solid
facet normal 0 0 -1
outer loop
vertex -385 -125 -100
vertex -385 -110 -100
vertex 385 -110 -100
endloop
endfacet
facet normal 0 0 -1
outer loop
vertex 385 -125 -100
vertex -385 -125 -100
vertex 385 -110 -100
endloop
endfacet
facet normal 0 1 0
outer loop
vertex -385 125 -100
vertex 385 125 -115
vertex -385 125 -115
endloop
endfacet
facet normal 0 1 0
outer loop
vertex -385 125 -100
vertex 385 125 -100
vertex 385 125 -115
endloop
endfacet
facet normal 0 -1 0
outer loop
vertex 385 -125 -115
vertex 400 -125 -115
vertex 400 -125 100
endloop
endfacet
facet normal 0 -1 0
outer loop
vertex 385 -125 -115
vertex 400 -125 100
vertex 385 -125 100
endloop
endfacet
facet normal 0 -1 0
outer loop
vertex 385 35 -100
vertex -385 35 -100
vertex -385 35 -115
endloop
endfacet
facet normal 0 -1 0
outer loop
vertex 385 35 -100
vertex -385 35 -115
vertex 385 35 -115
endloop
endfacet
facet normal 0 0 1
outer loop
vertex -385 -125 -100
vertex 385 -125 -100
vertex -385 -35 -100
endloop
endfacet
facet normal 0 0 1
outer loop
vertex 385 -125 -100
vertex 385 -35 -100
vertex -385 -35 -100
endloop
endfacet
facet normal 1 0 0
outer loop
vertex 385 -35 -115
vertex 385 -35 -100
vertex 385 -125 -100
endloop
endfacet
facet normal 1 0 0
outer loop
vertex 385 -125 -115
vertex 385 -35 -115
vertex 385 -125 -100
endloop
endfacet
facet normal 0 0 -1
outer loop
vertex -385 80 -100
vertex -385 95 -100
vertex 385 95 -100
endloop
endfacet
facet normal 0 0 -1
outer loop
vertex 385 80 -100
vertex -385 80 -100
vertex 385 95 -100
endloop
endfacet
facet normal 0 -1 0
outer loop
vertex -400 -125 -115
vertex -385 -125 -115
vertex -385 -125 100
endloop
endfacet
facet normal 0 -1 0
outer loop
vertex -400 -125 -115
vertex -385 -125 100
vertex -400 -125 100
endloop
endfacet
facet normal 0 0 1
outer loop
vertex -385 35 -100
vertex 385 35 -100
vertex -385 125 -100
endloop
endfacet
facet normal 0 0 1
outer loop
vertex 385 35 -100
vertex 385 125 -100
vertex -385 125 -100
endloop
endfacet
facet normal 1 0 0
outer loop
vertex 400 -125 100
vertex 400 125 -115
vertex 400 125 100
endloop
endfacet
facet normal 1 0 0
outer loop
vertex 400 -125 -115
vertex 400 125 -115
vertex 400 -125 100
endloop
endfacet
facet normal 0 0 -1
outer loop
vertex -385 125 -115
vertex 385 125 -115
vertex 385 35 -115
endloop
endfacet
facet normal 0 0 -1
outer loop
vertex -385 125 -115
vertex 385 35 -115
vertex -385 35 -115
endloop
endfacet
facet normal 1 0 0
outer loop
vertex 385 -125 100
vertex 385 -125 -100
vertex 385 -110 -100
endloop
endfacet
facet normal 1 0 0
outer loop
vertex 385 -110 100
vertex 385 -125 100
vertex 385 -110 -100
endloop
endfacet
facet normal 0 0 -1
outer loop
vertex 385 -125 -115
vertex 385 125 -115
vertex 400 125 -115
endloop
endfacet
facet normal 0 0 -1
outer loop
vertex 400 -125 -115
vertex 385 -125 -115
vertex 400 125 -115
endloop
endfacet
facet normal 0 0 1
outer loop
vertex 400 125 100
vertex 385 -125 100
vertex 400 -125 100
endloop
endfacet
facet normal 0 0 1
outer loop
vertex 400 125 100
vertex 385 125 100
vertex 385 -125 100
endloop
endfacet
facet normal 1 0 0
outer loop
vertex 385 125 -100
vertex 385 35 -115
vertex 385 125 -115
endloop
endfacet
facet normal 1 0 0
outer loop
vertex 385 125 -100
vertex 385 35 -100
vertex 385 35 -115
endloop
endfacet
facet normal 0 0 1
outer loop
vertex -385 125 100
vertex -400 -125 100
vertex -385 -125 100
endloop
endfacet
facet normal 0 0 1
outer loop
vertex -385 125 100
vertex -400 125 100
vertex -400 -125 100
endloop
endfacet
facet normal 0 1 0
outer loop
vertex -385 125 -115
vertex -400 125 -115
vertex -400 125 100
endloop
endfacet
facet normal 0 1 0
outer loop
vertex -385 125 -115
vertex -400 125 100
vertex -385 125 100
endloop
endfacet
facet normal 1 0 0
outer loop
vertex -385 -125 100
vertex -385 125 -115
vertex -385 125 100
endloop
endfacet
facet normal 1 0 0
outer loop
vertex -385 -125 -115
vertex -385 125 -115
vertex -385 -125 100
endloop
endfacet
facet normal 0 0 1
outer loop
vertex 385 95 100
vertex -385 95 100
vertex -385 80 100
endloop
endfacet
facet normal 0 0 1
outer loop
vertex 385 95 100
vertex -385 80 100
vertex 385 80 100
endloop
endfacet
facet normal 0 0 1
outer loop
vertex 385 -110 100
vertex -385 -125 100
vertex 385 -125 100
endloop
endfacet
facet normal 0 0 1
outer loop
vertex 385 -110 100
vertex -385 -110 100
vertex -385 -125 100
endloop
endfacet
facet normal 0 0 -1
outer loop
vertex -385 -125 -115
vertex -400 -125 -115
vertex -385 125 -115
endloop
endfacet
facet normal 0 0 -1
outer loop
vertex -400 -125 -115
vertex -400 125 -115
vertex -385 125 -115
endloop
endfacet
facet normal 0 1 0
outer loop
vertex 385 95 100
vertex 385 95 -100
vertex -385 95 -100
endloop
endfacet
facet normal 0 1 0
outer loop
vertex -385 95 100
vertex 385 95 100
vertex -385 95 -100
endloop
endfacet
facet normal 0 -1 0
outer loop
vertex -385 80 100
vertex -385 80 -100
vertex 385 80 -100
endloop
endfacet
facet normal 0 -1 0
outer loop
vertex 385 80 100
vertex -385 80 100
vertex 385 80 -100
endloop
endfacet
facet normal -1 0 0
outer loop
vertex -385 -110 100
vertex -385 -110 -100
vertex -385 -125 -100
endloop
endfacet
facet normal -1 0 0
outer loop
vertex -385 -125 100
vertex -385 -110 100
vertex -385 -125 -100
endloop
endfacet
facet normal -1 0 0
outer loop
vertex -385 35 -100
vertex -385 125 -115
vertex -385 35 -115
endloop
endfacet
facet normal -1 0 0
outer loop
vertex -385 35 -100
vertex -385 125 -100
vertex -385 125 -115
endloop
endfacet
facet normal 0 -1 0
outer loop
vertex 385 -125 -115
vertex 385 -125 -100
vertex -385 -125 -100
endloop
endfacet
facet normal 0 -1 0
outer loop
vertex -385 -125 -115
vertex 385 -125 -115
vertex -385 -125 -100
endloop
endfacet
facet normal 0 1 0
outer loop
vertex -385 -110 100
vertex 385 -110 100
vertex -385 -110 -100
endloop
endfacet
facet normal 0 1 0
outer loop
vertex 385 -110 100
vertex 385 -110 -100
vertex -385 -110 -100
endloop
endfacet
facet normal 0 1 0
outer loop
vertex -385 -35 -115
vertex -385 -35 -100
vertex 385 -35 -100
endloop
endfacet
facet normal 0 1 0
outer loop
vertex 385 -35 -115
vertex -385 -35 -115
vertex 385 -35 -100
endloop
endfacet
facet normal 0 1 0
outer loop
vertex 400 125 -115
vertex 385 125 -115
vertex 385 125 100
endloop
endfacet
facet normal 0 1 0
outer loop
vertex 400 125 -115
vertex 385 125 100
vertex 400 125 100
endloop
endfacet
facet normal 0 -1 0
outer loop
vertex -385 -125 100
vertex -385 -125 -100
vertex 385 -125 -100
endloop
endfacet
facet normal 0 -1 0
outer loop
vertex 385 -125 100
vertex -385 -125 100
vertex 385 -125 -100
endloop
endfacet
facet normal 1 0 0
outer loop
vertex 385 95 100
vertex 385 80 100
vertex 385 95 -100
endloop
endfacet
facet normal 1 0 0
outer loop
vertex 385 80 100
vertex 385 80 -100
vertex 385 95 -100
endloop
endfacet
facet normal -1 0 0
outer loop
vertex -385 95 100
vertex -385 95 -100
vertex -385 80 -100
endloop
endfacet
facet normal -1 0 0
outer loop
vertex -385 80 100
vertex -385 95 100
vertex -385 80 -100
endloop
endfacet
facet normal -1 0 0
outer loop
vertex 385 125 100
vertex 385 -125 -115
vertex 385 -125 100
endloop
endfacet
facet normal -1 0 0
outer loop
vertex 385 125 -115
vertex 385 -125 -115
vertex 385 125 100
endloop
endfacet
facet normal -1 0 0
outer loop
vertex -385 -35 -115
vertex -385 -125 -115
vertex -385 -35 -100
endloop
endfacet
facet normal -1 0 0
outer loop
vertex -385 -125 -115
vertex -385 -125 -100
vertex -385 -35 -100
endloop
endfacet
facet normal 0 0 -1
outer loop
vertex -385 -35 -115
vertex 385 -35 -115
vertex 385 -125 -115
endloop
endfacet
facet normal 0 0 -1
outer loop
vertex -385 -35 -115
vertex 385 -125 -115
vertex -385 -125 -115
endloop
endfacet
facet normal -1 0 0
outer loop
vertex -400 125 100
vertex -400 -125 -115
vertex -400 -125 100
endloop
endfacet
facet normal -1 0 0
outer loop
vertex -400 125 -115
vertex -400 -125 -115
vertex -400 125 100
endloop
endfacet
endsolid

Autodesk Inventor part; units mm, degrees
ref_plane "YZ Plane" through (0, 0, 0) normal (1, 0, 0) x (0, 1, 0)
ref_plane "XZ Plane" through (0, 0, 0) normal (0, 1, 0) x (-1, 0, 0)
ref_plane "XY Plane" through (0, 0, 0) normal (0, 0, 1) x (1, 0, 0)
sketch "Sketch1" plane through (0, 0, 0) normal (0, 0, 1) x (1, 0, 0)
  line L0 (-400, 125) -> (400, 125)
  line L1 (400, 125) -> (400, -125)
  line L2 (400, -125) -> (-400, -125)
  line L3 (-400, -125) -> (-400, 125)
  line L4 (-400, 125) -> (400, -125) construction
  line L5 (400, 125) -> (-400, -125) construction
  point P0 (0, 0)
  dimension "d0" = 800
  dimension "d1" = 250
sketch "Sketch2" plane through (0, 0, 0) normal (0, 1, 0) x (-1, 0, 0)
  line L0 (400, -100) -> (-400, -100)
  line L1 (-400, -100) -> (-400, 100)
  line L2 (-400, 100) -> (400, 100)
  line L3 (400, 100) -> (400, -100)
  line L4 (400, -100) -> (-400, 100) construction
  line L5 (-400, -100) -> (400, 100) construction
  point P0 (0, 0)
  dimension "d2" = 800
  dimension "d3" = 200
sketch "Sketch3" plane through (0, 0, 0) normal (0, 0, 1) x (1, 0, 0)
  line L0 (-400, -125) -> (-400, 125) construction
  line L1 (-400, 125) -> (-385, 125)
  line L2 (-385, 125) -> (-385, -125)
  line L3 (-385, -125) -> (-400, -125)
  line L4 (-400, -125) -> (-400, 125)
  point P0 (0, 0)
  dimension "d4" = 15
extrude "Extrusion1" add sketch "Sketch3" along normal mid plane 200
move faces "Move1" translate (0, 0, -15) faces at (-395, 41.6667, -100)
mirror "Mirror1" about plane through (0, 0, 0) normal (1, 0, 0)
sketch "Sketch4" plane through (0, 0, 0) normal (0, 0, 1) x (1, 0, 0)
  line L0 (400, -125) -> (-400, -125) construction
  line L1 (-385, -125) -> (-385, 125) construction
  line L2 (385, -125) -> (385, 125) construction
  line L3 (-385, -125) -> (385, -125)
  line L4 (385, -125) -> (385, -110)
  line L5 (385, -110) -> (-385, -110)
  line L6 (-385, -110) -> (-385, -125)
  point P0 (0, 0)
  dimension "d7" = 15
extrude "Extrusion2" add sketch "Sketch4" along normal mid plane 200 separate body
pattern_linear "Rectangular Pattern1" count 2 spacing 205 along (0, 1, 0) bodies 2
sketch "Sketch5" plane through (0, 0, -100) normal (0, 0, -1) x (-1, 0, 0)
  line L0 (-385, 125) -> (-385, -125) construction
  line L1 (385, 125) -> (385, -125) construction
  line L2 (-385, -125) -> (385, -125) construction
  line L3 (-385, 125) -> (385, 125)
  line L4 (385, 125) -> (385, 35)
  line L5 (385, 35) -> (-385, 35)
  line L6 (-385, 35) -> (-385, 125)
  line L7 (-385, -125) -> (385, -125)
  line L8 (385, -125) -> (385, -35)
  line L9 (385, -35) -> (-385, -35)
  line L10 (-385, -35) -> (-385, -125)
  point P0 (0, 0)
  dimension "d16" = 90
  dimension "d17" = 90
extrude "Extrusion3" add sketch "Sketch5" along normal blind 15 separate body contours L10 L9 L8 L7
extrude "Extrusion4" add sketch "Sketch5" along normal blind 15 separate body contours L3 L4 L5 L6
equation "\"d5\" = d3"
equation "\"d8\" = d3"
equation "\"d17\" = d16"
equation "\"d18\" = d4"
equation "\"d20\" = d4"
properties part number "MM_00001.1.0" material "Wood (Cherry)"
